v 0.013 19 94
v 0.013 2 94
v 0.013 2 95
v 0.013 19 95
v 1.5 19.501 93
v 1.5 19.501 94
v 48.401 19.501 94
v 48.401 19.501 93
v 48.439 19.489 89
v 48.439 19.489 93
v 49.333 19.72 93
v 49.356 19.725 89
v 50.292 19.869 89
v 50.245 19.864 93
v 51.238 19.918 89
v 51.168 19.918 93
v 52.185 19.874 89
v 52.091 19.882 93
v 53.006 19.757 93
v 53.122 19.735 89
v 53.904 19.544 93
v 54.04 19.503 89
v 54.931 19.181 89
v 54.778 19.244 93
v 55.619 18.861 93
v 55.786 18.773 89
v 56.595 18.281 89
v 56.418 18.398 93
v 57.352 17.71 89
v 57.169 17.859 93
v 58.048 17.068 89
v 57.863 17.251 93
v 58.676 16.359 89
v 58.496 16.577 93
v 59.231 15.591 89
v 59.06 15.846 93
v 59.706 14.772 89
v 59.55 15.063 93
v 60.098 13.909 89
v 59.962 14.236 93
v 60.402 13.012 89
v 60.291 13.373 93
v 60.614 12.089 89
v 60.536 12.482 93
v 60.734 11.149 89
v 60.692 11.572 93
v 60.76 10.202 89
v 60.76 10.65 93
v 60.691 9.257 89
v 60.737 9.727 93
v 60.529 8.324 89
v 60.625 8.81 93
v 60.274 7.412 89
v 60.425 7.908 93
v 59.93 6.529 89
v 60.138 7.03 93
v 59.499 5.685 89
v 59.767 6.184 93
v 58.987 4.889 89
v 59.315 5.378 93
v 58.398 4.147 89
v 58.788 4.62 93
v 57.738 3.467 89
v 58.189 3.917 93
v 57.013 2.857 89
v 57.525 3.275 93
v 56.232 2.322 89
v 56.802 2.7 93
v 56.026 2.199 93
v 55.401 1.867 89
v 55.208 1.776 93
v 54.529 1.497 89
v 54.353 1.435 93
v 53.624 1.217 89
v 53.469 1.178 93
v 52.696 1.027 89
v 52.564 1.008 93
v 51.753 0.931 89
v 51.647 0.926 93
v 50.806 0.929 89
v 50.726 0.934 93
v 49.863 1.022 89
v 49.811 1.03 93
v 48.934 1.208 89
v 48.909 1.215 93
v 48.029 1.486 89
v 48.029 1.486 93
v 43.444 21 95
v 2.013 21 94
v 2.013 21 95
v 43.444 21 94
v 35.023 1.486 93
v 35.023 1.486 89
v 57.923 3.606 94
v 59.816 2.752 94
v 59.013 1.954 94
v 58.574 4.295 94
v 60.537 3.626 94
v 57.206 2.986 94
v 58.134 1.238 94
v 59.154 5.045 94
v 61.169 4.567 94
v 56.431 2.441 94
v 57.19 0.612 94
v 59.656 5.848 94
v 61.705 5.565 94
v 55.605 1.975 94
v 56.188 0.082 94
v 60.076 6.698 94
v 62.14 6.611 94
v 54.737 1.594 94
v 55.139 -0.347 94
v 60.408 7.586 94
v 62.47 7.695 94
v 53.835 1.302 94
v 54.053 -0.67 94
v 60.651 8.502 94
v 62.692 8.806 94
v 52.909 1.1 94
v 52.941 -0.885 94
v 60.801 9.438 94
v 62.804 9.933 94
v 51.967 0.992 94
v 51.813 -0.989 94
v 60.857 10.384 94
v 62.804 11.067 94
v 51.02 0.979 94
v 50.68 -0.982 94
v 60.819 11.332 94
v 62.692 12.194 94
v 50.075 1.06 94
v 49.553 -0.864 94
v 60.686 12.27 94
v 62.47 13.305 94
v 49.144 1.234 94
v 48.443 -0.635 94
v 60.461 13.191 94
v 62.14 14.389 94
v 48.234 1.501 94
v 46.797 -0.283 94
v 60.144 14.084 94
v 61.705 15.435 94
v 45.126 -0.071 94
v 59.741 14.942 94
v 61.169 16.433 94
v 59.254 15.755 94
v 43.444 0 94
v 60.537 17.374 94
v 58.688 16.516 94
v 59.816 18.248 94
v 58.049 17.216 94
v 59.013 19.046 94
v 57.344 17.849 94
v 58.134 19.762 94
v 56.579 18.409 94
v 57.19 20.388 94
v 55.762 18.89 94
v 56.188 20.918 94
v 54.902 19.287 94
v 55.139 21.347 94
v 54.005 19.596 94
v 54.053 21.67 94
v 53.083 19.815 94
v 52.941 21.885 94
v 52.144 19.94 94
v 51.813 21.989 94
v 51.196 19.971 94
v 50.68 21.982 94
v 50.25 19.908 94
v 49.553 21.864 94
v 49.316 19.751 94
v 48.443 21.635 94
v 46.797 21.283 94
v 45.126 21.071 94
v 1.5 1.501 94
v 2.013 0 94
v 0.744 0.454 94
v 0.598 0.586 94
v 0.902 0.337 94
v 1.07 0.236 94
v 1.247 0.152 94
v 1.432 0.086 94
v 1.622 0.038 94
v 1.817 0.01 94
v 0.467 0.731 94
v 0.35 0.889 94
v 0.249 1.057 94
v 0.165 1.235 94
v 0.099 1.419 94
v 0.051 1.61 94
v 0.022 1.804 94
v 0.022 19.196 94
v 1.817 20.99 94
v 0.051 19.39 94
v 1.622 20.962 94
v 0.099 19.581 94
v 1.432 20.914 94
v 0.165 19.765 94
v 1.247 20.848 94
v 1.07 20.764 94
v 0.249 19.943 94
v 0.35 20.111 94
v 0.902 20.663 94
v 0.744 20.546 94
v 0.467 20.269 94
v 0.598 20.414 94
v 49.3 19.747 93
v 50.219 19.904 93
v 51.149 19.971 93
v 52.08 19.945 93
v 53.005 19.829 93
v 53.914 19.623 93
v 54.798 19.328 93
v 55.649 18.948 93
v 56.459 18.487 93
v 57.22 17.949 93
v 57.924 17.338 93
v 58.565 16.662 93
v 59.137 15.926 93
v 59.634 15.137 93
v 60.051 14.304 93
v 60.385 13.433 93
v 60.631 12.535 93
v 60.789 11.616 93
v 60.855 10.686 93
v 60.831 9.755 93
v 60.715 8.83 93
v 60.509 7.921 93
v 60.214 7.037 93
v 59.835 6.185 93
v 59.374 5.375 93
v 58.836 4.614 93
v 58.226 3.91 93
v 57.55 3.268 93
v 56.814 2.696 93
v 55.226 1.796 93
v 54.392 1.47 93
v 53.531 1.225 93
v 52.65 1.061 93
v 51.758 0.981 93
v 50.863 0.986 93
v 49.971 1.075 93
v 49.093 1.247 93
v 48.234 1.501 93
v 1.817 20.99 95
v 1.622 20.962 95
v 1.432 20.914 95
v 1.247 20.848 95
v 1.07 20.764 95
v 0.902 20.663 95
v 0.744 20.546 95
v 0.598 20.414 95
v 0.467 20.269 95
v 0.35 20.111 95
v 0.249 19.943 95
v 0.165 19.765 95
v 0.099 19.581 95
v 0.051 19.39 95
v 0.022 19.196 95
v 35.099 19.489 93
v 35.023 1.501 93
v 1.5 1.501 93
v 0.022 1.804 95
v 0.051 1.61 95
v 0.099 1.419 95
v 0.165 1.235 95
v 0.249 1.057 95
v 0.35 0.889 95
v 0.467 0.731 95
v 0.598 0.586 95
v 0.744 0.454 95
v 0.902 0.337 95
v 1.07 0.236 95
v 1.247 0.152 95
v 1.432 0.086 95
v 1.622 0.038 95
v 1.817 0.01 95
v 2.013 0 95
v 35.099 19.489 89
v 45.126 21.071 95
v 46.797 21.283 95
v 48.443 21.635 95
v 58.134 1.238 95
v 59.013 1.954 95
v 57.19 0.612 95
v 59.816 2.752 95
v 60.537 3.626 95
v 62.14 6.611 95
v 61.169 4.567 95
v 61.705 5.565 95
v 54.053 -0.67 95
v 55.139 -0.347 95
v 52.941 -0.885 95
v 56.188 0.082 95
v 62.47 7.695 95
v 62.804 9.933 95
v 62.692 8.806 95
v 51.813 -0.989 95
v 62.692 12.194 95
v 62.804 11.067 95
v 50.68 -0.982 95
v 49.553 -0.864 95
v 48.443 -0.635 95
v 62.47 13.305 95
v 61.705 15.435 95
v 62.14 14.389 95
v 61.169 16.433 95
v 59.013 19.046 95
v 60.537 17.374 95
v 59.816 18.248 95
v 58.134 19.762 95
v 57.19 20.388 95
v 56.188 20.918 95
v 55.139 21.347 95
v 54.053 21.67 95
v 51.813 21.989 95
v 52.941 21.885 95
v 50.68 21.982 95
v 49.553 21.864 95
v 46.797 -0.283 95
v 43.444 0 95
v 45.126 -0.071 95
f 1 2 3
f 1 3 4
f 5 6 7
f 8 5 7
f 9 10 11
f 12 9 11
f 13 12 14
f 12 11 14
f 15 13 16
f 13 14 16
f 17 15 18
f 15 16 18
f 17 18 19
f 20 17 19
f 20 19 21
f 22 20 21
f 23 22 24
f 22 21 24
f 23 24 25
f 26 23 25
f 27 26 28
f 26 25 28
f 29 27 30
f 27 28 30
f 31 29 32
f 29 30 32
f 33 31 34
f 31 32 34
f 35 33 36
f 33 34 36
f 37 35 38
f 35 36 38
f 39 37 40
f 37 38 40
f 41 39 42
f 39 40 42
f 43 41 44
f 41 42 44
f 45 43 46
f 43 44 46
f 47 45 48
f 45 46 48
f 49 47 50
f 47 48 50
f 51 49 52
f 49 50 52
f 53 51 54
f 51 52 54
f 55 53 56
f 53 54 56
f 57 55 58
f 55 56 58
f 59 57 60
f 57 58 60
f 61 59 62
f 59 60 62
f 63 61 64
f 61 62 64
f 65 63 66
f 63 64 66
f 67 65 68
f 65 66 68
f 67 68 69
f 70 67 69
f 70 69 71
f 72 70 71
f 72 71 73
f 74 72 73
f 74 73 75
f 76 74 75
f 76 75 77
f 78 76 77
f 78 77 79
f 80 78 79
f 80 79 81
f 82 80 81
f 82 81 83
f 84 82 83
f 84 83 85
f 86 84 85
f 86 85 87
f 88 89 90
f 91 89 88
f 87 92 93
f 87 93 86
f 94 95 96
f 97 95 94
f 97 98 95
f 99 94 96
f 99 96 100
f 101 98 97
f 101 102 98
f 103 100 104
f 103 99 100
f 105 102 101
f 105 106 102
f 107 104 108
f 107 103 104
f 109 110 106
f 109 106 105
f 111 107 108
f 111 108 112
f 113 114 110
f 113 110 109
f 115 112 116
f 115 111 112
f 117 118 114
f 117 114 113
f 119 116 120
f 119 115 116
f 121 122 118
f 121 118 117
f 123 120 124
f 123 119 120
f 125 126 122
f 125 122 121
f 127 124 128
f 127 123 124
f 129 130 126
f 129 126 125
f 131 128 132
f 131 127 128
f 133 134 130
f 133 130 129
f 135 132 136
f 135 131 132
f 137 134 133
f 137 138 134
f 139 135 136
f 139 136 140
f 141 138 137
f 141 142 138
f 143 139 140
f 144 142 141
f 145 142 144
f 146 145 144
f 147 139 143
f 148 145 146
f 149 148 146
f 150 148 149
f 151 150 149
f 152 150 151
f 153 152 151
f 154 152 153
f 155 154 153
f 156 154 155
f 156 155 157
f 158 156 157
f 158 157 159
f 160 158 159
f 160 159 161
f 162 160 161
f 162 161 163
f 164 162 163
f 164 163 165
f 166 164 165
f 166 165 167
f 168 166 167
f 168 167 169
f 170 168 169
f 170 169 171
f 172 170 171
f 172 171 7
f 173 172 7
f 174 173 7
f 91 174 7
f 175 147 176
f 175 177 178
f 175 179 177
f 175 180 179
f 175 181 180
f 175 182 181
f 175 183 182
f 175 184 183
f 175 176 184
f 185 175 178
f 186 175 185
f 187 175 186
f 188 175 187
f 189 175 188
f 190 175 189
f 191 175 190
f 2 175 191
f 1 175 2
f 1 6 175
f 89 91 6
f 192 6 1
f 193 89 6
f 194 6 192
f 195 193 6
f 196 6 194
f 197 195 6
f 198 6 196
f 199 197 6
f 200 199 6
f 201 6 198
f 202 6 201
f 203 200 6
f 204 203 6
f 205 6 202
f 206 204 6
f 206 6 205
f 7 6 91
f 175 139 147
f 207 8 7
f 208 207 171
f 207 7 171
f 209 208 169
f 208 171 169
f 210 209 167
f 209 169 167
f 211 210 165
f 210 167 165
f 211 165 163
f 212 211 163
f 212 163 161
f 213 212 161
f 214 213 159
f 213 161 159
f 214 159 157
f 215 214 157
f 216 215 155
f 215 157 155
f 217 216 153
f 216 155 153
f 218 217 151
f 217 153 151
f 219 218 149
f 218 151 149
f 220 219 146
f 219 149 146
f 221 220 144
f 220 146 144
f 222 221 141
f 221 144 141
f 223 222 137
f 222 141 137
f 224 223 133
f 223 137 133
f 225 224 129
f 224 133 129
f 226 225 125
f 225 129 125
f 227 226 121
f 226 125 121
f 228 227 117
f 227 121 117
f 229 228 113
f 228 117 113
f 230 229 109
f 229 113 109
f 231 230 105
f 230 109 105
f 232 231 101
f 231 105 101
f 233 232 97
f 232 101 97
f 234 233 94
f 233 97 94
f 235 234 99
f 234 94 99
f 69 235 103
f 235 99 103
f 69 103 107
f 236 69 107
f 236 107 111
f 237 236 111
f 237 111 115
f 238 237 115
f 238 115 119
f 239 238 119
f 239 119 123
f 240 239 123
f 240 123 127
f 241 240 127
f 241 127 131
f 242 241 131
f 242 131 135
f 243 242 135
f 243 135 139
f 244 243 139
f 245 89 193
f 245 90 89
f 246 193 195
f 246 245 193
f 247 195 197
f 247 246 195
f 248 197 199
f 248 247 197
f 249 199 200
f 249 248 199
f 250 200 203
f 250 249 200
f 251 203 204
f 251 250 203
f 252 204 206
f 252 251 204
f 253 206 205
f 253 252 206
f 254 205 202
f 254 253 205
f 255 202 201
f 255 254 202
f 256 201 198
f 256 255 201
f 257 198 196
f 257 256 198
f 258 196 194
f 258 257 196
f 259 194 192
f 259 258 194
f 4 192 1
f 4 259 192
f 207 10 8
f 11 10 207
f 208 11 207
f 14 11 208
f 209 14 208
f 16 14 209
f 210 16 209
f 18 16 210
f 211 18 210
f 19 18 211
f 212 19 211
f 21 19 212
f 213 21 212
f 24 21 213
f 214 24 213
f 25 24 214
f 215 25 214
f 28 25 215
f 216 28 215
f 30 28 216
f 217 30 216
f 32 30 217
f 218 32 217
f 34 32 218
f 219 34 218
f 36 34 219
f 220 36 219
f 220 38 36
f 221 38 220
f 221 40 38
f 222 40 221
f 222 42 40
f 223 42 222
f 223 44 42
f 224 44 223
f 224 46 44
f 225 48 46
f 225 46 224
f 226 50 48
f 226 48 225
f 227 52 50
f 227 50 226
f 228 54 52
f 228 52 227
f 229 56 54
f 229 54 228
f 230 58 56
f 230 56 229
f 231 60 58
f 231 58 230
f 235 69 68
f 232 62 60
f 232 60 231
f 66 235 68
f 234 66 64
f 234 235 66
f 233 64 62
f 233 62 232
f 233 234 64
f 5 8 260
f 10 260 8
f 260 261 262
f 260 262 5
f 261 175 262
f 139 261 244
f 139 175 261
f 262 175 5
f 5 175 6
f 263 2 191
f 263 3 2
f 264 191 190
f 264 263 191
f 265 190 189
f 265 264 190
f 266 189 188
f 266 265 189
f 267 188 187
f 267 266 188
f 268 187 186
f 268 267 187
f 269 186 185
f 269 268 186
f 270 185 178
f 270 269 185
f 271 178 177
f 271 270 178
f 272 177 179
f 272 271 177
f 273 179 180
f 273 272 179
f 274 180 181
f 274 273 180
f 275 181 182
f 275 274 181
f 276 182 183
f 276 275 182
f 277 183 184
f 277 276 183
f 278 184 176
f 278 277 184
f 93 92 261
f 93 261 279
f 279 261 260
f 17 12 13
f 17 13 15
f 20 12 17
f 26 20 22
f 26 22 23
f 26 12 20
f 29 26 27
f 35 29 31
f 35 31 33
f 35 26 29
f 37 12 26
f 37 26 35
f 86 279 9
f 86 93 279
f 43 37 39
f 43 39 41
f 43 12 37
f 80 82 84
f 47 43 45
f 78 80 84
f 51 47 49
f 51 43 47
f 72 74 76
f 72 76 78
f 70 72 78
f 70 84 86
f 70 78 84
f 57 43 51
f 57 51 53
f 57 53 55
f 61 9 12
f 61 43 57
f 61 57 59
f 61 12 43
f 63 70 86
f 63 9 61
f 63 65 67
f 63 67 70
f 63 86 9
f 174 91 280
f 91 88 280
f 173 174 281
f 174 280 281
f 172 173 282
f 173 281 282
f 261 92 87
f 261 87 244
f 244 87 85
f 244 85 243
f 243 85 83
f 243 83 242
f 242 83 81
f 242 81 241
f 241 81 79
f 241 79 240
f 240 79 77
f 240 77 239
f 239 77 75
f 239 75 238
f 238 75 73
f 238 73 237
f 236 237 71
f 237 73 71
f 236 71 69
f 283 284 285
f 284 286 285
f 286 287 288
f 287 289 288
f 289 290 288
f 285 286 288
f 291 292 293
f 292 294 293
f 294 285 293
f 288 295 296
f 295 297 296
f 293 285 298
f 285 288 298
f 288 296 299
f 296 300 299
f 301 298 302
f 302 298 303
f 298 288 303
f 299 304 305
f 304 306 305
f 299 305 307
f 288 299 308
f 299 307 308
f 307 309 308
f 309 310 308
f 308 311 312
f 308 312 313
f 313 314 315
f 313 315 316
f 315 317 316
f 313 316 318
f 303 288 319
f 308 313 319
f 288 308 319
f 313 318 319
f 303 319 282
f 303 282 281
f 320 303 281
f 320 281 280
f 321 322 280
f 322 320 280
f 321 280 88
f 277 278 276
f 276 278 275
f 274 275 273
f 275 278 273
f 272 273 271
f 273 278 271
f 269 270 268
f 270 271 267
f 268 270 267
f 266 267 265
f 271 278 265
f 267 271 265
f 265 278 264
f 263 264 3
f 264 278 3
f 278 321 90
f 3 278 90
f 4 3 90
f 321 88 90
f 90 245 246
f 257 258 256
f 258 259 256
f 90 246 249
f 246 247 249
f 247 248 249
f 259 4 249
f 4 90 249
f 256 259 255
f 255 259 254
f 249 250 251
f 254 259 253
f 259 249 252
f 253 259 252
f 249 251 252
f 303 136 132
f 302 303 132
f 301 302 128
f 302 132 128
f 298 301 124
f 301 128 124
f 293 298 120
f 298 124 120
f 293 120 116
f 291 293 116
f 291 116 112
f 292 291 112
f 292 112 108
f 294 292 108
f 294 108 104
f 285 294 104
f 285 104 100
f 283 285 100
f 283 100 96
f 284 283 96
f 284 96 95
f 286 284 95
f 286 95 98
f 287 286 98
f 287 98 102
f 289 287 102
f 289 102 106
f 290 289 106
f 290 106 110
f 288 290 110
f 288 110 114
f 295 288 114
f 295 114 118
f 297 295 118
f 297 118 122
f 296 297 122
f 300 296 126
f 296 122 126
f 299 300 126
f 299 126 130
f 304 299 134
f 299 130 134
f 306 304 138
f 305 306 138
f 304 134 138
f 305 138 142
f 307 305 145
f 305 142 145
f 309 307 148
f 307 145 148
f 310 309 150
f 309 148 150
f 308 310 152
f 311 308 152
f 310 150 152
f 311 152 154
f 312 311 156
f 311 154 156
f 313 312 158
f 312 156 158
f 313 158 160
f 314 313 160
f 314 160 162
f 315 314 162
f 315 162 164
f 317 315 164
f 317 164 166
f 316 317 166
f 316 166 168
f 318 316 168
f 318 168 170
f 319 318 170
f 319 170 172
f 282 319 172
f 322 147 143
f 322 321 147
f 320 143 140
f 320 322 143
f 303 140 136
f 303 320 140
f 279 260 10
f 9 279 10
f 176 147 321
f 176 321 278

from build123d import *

# Parameters (mm, degrees)
PAD003_DEPTH = 1
PAD004_DEPTH = 1
FILLET012_R  = 20
FILLET013_R  = 2
FILLET014_R  = 2
FILLET015_R  = 20
PAD005_DEPTH = 4


with BuildPart() as part:
    # Sketch008 → Pad003 (new body)
    with BuildSketch(Plane.XY.offset(94)):
        with BuildLine():
            Line((0.012651, 21), (46.627451, 21))
            ThreePointArc((46.627451, 0), (62.817867, 10.5), (46.627451, 21))
            Line((46.627451, 0), (0.012651, 0))
            Line((0.012651, 0), (0.012651, 21))
        make_face()
    extrude(amount=PAD003_DEPTH)

    # Sketch010 → Pad004 (new body)
    with BuildSketch(Plane(origin=(0, 0, 94), x_dir=(1, 0, 0), z_dir=(0, 0, -1))):
        with BuildLine():
            Line((1.500068, -19.50111), (48.401309, -19.50111))
            ThreePointArc((48.401309, -19.50111), (60.857293, -10.384488), (48.233904, -1.50111))
            Line((1.500068, -1.50111), (48.233904, -1.50111))
            Line((1.500068, -1.50111), (1.500068, -19.50111))
        make_face()
    extrude(amount=PAD004_DEPTH)

    # Fillet012
    fillet012_edges = [part.edges().sort_by_distance(p)[0] for p in [
        (46.627451, 21, 94.5),
    ]]
    fillet(fillet012_edges, radius=FILLET012_R)

    # Fillet013
    fillet013_edges = [part.edges().sort_by_distance(p)[0] for p in [
        (0.012651, 21, 94.5),
    ]]
    fillet(fillet013_edges, radius=FILLET013_R)

    # Fillet014
    fillet014_edges = [part.edges().sort_by_distance(p)[0] for p in [
        (0.012651, 0, 94.5),
    ]]
    fillet(fillet014_edges, radius=FILLET014_R)

    # Fillet015
    fillet015_edges = [part.edges().sort_by_distance(p)[0] for p in [
        (46.627451, 0, 94.5),
    ]]
    fillet(fillet015_edges, radius=FILLET015_R)

    # Sketch011 → Pad005 (new body)
    with BuildSketch(Plane(origin=(0, 0, 93), x_dir=(1, 0, 0), z_dir=(0, 0, -1))):
        with BuildLine():
            Line((35.099449, -19.488966), (48.43856, -19.488966))
            ThreePointArc((48.43856, -19.488966), (60.760017, -10.202199), (48.02877, -1.485682))
            Line((35.023422, -1.485682), (48.02877, -1.485682))
            Line((35.023422, -1.485682), (35.099449, -19.488966))
        make_face()
    extrude(amount=PAD005_DEPTH)


solid = part.part
